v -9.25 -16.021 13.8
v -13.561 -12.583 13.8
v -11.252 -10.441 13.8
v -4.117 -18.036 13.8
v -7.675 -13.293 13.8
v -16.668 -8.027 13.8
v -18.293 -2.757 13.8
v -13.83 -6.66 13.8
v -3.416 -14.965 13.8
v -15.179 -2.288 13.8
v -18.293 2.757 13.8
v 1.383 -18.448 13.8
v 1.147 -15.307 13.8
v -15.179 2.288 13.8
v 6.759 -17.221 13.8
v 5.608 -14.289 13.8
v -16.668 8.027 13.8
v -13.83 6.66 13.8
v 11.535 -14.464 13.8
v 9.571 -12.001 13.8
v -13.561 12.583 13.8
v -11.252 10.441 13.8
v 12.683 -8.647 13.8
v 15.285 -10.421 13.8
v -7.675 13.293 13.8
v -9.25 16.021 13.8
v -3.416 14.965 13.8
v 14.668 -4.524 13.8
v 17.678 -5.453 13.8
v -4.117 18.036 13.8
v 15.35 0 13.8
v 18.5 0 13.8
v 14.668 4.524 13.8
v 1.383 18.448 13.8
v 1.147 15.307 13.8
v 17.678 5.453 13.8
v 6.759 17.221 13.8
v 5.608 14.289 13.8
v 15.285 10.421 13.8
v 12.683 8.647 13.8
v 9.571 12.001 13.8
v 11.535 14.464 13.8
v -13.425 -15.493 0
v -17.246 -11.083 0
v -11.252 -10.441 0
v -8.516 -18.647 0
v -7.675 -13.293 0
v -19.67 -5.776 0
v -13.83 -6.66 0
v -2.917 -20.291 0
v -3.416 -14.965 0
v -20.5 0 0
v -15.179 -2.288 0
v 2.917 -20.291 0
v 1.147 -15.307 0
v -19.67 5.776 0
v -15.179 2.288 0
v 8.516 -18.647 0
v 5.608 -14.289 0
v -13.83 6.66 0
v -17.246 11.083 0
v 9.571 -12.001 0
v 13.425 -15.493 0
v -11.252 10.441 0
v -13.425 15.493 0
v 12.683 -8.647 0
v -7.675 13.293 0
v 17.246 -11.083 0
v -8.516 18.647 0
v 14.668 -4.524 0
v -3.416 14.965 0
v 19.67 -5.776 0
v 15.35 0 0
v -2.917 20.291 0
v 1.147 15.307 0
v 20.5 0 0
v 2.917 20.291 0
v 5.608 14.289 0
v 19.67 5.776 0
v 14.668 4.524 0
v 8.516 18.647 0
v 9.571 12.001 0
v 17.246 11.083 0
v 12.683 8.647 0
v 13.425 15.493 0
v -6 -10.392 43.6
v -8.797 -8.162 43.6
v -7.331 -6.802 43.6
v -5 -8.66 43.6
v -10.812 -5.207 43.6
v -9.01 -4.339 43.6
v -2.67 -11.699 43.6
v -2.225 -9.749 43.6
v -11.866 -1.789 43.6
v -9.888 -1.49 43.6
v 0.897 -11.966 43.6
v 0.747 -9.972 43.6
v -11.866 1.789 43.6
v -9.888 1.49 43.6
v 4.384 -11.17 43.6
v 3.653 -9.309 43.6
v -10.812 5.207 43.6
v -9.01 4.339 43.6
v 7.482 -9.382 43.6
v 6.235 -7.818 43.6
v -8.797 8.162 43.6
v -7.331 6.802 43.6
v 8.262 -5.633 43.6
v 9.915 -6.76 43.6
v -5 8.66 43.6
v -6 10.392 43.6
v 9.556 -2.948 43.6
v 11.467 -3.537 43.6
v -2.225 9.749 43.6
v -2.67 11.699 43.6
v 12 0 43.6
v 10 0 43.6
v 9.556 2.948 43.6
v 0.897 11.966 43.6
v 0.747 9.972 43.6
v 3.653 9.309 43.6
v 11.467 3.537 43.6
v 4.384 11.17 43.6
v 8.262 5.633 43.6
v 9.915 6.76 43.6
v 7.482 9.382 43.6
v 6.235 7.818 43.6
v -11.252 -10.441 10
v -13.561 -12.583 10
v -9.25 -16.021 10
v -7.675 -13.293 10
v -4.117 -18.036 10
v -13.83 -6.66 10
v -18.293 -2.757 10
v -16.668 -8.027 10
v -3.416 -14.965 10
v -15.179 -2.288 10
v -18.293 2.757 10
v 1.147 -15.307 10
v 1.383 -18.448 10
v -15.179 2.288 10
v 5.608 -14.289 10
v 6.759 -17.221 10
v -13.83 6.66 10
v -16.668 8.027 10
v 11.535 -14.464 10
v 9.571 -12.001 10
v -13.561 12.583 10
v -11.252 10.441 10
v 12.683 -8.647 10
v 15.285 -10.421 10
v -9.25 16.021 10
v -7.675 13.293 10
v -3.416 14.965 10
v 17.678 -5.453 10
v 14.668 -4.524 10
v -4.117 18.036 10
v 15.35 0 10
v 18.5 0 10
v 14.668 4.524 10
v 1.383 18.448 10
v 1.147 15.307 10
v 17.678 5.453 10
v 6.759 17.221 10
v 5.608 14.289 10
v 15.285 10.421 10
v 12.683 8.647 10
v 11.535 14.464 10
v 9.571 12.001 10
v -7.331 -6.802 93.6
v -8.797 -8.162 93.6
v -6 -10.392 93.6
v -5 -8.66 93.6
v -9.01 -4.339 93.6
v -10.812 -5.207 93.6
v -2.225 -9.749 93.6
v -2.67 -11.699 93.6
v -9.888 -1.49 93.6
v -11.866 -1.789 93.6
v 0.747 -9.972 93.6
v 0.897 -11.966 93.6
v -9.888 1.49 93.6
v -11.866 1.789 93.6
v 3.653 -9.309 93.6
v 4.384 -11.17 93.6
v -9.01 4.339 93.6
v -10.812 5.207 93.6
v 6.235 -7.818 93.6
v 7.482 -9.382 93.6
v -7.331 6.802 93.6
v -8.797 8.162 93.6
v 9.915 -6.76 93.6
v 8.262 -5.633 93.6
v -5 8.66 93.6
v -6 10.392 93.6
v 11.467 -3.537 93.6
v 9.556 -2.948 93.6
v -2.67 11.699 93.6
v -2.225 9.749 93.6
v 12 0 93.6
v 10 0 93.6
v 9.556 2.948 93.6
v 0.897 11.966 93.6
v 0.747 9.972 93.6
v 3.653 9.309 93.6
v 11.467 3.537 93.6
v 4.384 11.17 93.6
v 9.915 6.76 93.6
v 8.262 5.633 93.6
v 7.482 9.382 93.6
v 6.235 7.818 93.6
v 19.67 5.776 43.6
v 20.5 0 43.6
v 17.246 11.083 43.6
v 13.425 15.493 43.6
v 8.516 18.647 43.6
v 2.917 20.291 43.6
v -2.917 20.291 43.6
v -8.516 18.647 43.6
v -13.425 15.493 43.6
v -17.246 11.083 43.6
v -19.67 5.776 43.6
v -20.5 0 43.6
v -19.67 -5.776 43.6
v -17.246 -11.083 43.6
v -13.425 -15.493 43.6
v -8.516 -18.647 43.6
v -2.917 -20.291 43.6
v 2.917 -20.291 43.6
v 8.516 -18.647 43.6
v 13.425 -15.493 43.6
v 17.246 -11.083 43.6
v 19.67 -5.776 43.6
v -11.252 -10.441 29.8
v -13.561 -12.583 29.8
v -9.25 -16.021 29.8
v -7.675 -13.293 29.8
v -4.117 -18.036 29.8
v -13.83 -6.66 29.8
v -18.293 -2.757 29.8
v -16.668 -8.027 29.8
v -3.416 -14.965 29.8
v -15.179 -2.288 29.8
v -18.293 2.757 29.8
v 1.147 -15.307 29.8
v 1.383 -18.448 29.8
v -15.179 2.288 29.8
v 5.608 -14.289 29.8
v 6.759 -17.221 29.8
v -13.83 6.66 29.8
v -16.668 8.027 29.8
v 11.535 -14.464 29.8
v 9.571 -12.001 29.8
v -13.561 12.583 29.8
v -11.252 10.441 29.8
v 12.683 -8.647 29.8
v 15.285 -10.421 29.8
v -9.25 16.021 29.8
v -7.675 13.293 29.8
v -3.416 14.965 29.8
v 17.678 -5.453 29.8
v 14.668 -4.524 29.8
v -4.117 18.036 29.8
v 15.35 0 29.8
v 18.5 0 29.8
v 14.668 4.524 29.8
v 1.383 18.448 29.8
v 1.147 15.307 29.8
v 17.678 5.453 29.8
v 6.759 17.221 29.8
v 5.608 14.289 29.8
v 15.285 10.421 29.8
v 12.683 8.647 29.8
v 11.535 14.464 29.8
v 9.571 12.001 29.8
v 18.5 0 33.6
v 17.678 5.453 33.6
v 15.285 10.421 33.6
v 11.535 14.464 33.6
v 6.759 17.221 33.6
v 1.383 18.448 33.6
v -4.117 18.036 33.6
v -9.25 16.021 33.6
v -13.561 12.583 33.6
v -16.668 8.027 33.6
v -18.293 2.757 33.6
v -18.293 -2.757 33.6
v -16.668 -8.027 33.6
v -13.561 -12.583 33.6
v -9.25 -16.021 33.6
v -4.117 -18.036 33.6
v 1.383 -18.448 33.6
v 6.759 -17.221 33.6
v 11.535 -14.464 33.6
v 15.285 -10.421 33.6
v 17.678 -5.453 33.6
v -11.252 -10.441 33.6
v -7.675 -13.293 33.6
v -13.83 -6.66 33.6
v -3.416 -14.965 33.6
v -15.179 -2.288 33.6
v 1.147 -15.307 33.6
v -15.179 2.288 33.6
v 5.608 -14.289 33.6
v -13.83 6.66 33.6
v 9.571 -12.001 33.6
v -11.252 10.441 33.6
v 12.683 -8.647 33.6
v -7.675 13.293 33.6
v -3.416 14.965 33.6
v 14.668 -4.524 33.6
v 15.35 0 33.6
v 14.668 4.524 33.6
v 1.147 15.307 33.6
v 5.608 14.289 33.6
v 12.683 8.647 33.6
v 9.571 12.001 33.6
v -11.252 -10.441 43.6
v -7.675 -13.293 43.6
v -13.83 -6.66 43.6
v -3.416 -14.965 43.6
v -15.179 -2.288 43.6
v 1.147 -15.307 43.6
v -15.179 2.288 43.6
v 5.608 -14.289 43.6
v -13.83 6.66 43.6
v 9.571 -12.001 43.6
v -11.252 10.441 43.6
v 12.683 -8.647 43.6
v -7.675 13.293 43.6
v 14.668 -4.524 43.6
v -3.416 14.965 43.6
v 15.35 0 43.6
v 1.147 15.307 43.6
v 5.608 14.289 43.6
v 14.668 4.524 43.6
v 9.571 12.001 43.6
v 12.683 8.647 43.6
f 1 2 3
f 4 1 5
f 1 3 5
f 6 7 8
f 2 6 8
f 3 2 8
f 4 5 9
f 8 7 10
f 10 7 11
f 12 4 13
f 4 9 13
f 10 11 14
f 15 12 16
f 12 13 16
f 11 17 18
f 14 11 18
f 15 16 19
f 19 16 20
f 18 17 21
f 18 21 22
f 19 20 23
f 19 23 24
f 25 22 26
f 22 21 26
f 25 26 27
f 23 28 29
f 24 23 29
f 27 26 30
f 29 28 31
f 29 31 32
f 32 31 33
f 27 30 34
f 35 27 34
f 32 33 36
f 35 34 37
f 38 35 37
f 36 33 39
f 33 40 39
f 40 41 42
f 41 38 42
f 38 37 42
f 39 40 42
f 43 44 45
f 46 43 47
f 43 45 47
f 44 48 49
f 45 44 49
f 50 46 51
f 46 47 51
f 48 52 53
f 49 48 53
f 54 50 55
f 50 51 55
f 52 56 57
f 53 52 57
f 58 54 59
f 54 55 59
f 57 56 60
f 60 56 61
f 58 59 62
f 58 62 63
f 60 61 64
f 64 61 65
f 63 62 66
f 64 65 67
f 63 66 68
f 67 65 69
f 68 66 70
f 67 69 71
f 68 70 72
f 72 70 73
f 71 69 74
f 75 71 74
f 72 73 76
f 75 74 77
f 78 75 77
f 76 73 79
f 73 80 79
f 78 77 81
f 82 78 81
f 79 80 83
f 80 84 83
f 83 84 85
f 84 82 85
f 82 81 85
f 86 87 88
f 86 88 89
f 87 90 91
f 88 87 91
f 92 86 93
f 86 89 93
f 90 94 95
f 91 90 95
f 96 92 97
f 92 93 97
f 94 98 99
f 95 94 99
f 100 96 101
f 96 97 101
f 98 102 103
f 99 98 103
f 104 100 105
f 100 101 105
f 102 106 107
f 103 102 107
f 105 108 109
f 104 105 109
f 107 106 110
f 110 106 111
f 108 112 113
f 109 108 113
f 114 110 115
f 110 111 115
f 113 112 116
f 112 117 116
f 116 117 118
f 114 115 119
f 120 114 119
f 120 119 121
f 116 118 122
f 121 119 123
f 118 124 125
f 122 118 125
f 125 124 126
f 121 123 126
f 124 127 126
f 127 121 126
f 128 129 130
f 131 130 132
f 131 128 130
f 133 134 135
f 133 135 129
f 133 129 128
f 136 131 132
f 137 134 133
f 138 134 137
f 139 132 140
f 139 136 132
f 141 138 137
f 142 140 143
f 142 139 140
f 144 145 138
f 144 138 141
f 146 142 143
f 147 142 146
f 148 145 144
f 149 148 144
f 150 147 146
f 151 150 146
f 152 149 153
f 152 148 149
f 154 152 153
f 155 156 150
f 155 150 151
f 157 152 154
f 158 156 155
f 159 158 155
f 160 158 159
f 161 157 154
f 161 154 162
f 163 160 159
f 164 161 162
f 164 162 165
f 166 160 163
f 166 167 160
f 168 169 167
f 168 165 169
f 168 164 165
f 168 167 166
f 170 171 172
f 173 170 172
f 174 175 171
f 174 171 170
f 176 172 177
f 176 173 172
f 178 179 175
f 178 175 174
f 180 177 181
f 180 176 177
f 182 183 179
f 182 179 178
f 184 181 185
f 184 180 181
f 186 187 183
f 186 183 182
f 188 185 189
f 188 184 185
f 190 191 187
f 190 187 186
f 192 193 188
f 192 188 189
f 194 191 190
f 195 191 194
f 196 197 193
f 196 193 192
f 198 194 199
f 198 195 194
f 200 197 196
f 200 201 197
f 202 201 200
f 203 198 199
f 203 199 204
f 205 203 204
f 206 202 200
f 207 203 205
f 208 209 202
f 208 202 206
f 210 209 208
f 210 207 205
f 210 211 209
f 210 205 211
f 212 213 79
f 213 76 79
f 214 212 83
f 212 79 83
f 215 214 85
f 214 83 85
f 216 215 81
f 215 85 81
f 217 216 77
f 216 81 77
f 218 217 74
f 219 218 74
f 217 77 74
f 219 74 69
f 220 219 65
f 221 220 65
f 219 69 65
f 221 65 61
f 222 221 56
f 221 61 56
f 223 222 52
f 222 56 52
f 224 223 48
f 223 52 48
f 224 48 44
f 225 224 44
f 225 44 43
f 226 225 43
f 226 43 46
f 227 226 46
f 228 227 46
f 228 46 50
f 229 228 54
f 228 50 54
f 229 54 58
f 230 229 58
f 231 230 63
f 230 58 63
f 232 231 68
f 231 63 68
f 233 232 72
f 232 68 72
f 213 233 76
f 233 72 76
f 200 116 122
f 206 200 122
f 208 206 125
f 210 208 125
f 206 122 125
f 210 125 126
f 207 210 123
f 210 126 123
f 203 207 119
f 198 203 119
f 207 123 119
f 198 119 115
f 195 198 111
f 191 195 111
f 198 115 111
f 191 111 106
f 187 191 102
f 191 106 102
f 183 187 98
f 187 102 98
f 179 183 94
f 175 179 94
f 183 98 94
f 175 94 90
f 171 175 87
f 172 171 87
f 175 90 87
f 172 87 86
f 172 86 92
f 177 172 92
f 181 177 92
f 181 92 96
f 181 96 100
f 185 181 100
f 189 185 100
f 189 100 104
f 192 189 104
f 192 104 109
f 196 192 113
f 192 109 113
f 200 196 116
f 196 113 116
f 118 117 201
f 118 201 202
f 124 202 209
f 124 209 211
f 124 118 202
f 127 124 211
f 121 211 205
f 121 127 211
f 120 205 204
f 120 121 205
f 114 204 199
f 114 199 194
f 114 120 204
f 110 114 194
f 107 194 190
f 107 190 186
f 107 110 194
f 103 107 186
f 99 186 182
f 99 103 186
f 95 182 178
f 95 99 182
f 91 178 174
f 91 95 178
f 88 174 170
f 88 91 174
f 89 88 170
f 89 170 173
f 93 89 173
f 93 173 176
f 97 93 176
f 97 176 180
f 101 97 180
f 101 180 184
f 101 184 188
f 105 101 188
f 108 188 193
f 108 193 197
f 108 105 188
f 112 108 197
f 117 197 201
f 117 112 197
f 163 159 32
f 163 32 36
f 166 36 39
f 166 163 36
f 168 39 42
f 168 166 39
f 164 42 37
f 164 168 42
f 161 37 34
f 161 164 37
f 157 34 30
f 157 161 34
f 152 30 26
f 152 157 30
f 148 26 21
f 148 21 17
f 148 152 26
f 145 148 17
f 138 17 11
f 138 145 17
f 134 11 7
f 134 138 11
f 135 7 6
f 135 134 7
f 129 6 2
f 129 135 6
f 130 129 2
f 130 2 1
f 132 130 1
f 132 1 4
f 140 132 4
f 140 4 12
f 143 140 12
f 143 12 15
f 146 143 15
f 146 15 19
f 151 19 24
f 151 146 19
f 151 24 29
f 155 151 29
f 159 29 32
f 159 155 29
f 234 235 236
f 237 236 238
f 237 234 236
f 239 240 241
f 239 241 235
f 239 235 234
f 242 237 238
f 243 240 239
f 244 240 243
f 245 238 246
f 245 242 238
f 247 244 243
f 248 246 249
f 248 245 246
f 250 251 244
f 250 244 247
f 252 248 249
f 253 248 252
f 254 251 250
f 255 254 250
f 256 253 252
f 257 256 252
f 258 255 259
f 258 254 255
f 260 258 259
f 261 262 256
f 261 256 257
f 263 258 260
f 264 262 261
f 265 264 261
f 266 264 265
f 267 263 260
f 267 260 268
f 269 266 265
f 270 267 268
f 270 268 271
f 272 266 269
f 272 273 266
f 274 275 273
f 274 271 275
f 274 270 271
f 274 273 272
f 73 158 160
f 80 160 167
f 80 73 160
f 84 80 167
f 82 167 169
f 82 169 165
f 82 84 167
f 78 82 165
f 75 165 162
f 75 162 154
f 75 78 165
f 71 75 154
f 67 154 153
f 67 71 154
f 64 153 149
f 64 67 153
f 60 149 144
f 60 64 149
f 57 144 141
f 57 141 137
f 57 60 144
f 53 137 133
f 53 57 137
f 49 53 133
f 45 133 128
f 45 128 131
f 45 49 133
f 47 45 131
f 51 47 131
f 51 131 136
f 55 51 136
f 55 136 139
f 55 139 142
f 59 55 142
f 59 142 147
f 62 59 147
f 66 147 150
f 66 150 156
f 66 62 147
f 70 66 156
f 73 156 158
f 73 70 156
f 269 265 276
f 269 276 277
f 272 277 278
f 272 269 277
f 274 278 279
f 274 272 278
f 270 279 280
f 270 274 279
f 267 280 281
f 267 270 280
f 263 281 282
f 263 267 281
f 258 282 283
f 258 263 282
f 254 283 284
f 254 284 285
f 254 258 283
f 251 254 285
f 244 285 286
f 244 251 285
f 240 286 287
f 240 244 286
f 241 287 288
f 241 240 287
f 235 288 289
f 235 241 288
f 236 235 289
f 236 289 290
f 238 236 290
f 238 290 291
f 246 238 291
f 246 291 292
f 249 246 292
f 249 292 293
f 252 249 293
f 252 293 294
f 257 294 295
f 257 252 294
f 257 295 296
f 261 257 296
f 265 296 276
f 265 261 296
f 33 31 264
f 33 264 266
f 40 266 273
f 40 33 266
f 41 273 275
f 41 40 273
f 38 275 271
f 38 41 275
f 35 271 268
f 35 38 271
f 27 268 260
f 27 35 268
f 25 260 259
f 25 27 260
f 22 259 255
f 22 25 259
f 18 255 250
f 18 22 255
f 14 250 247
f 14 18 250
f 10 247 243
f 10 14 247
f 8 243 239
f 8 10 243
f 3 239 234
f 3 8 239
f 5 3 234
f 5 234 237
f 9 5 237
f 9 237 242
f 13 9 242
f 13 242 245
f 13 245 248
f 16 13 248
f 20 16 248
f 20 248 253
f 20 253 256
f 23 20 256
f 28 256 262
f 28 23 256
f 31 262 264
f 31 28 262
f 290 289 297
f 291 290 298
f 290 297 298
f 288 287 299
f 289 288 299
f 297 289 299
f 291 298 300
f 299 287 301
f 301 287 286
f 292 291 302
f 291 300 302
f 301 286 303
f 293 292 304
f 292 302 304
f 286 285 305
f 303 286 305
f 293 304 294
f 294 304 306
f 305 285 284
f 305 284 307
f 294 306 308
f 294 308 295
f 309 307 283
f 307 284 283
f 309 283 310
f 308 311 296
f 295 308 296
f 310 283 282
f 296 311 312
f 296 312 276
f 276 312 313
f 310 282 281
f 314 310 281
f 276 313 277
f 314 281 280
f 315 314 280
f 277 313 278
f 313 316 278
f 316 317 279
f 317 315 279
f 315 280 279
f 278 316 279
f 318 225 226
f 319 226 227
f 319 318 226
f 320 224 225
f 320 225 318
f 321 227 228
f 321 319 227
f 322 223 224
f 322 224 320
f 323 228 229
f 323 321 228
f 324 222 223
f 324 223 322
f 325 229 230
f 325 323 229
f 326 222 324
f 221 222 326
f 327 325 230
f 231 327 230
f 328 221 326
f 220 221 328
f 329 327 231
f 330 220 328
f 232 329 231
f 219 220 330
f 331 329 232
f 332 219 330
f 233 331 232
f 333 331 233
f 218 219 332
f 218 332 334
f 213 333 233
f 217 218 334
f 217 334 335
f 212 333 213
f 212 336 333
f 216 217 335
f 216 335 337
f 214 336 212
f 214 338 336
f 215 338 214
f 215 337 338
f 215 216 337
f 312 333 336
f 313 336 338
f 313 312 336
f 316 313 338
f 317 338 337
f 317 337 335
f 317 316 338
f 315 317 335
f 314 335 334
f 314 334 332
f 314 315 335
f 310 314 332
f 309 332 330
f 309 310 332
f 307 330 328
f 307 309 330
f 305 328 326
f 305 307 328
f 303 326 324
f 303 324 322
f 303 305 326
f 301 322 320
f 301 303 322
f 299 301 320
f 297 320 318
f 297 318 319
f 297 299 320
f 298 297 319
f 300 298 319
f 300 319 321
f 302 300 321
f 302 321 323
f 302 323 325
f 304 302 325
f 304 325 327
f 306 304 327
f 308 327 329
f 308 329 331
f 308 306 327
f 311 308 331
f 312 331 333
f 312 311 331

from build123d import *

# Parameters (mm, degrees)
F0_R      = 20.5
F0_R_2    = 15.35
F1_DEPTH  = 10
F2_R      = 20.5
F2_R_2    = 18.5
F3_DEPTH  = 3.8
F4_R      = 20.5
F4_R_2    = 18.5
F4_R_3    = 15.35
F5_DEPTH  = 16
F6_R      = 20.5
F6_R_2    = 18.5
F7_DEPTH  = 3.8
F8_R      = 20.5
F8_R_2    = 18.5
F8_R_3    = 15.35
F9_DEPTH  = 10
F10_R     = 12
F10_R_2   = 10
F11_DEPTH = 50


with BuildPart() as f1:
    # F0 (on Top) → F1 (new body)
    with BuildSketch(Plane.XY):
        Circle(F0_R)
        Circle(F0_R_2, mode=Mode.SUBTRACT)
    extrude(amount=F1_DEPTH)

    # F2 (on face) → F3 (join)
    with BuildSketch(Plane.XY.offset(10)):
        Circle(F2_R)
        Circle(F2_R_2, mode=Mode.SUBTRACT)
    extrude(amount=F3_DEPTH)

    # F4 (on face) → F5 (join)
    with BuildSketch(Plane.XY.offset(13.8)):
        Circle(F4_R)
        Circle(F4_R_2, mode=Mode.SUBTRACT)
        Circle(F4_R_2)
        Circle(F4_R_3, mode=Mode.SUBTRACT)
    extrude(amount=F5_DEPTH)

    # F6 (on face) → F7 (join)
    with BuildSketch(Plane.XY.offset(29.8)):
        Circle(F6_R)
        Circle(F6_R_2, mode=Mode.SUBTRACT)
    extrude(amount=F7_DEPTH)

    # F8 (on face) → F9 (join)
    with BuildSketch(Plane.XY.offset(33.6)):
        Circle(F8_R)
        Circle(F8_R_2, mode=Mode.SUBTRACT)
        Circle(F8_R_2)
        Circle(F8_R_3, mode=Mode.SUBTRACT)
    extrude(amount=F9_DEPTH)


with BuildPart() as f11:
    # F10 (on face) → F11 (new body)
    with BuildSketch(Plane.XY.offset(43.6)):
        Circle(F10_R)
        Circle(F10_R_2, mode=Mode.SUBTRACT)
    extrude(amount=F11_DEPTH)


solid = Compound([f1.part, f11.part])
